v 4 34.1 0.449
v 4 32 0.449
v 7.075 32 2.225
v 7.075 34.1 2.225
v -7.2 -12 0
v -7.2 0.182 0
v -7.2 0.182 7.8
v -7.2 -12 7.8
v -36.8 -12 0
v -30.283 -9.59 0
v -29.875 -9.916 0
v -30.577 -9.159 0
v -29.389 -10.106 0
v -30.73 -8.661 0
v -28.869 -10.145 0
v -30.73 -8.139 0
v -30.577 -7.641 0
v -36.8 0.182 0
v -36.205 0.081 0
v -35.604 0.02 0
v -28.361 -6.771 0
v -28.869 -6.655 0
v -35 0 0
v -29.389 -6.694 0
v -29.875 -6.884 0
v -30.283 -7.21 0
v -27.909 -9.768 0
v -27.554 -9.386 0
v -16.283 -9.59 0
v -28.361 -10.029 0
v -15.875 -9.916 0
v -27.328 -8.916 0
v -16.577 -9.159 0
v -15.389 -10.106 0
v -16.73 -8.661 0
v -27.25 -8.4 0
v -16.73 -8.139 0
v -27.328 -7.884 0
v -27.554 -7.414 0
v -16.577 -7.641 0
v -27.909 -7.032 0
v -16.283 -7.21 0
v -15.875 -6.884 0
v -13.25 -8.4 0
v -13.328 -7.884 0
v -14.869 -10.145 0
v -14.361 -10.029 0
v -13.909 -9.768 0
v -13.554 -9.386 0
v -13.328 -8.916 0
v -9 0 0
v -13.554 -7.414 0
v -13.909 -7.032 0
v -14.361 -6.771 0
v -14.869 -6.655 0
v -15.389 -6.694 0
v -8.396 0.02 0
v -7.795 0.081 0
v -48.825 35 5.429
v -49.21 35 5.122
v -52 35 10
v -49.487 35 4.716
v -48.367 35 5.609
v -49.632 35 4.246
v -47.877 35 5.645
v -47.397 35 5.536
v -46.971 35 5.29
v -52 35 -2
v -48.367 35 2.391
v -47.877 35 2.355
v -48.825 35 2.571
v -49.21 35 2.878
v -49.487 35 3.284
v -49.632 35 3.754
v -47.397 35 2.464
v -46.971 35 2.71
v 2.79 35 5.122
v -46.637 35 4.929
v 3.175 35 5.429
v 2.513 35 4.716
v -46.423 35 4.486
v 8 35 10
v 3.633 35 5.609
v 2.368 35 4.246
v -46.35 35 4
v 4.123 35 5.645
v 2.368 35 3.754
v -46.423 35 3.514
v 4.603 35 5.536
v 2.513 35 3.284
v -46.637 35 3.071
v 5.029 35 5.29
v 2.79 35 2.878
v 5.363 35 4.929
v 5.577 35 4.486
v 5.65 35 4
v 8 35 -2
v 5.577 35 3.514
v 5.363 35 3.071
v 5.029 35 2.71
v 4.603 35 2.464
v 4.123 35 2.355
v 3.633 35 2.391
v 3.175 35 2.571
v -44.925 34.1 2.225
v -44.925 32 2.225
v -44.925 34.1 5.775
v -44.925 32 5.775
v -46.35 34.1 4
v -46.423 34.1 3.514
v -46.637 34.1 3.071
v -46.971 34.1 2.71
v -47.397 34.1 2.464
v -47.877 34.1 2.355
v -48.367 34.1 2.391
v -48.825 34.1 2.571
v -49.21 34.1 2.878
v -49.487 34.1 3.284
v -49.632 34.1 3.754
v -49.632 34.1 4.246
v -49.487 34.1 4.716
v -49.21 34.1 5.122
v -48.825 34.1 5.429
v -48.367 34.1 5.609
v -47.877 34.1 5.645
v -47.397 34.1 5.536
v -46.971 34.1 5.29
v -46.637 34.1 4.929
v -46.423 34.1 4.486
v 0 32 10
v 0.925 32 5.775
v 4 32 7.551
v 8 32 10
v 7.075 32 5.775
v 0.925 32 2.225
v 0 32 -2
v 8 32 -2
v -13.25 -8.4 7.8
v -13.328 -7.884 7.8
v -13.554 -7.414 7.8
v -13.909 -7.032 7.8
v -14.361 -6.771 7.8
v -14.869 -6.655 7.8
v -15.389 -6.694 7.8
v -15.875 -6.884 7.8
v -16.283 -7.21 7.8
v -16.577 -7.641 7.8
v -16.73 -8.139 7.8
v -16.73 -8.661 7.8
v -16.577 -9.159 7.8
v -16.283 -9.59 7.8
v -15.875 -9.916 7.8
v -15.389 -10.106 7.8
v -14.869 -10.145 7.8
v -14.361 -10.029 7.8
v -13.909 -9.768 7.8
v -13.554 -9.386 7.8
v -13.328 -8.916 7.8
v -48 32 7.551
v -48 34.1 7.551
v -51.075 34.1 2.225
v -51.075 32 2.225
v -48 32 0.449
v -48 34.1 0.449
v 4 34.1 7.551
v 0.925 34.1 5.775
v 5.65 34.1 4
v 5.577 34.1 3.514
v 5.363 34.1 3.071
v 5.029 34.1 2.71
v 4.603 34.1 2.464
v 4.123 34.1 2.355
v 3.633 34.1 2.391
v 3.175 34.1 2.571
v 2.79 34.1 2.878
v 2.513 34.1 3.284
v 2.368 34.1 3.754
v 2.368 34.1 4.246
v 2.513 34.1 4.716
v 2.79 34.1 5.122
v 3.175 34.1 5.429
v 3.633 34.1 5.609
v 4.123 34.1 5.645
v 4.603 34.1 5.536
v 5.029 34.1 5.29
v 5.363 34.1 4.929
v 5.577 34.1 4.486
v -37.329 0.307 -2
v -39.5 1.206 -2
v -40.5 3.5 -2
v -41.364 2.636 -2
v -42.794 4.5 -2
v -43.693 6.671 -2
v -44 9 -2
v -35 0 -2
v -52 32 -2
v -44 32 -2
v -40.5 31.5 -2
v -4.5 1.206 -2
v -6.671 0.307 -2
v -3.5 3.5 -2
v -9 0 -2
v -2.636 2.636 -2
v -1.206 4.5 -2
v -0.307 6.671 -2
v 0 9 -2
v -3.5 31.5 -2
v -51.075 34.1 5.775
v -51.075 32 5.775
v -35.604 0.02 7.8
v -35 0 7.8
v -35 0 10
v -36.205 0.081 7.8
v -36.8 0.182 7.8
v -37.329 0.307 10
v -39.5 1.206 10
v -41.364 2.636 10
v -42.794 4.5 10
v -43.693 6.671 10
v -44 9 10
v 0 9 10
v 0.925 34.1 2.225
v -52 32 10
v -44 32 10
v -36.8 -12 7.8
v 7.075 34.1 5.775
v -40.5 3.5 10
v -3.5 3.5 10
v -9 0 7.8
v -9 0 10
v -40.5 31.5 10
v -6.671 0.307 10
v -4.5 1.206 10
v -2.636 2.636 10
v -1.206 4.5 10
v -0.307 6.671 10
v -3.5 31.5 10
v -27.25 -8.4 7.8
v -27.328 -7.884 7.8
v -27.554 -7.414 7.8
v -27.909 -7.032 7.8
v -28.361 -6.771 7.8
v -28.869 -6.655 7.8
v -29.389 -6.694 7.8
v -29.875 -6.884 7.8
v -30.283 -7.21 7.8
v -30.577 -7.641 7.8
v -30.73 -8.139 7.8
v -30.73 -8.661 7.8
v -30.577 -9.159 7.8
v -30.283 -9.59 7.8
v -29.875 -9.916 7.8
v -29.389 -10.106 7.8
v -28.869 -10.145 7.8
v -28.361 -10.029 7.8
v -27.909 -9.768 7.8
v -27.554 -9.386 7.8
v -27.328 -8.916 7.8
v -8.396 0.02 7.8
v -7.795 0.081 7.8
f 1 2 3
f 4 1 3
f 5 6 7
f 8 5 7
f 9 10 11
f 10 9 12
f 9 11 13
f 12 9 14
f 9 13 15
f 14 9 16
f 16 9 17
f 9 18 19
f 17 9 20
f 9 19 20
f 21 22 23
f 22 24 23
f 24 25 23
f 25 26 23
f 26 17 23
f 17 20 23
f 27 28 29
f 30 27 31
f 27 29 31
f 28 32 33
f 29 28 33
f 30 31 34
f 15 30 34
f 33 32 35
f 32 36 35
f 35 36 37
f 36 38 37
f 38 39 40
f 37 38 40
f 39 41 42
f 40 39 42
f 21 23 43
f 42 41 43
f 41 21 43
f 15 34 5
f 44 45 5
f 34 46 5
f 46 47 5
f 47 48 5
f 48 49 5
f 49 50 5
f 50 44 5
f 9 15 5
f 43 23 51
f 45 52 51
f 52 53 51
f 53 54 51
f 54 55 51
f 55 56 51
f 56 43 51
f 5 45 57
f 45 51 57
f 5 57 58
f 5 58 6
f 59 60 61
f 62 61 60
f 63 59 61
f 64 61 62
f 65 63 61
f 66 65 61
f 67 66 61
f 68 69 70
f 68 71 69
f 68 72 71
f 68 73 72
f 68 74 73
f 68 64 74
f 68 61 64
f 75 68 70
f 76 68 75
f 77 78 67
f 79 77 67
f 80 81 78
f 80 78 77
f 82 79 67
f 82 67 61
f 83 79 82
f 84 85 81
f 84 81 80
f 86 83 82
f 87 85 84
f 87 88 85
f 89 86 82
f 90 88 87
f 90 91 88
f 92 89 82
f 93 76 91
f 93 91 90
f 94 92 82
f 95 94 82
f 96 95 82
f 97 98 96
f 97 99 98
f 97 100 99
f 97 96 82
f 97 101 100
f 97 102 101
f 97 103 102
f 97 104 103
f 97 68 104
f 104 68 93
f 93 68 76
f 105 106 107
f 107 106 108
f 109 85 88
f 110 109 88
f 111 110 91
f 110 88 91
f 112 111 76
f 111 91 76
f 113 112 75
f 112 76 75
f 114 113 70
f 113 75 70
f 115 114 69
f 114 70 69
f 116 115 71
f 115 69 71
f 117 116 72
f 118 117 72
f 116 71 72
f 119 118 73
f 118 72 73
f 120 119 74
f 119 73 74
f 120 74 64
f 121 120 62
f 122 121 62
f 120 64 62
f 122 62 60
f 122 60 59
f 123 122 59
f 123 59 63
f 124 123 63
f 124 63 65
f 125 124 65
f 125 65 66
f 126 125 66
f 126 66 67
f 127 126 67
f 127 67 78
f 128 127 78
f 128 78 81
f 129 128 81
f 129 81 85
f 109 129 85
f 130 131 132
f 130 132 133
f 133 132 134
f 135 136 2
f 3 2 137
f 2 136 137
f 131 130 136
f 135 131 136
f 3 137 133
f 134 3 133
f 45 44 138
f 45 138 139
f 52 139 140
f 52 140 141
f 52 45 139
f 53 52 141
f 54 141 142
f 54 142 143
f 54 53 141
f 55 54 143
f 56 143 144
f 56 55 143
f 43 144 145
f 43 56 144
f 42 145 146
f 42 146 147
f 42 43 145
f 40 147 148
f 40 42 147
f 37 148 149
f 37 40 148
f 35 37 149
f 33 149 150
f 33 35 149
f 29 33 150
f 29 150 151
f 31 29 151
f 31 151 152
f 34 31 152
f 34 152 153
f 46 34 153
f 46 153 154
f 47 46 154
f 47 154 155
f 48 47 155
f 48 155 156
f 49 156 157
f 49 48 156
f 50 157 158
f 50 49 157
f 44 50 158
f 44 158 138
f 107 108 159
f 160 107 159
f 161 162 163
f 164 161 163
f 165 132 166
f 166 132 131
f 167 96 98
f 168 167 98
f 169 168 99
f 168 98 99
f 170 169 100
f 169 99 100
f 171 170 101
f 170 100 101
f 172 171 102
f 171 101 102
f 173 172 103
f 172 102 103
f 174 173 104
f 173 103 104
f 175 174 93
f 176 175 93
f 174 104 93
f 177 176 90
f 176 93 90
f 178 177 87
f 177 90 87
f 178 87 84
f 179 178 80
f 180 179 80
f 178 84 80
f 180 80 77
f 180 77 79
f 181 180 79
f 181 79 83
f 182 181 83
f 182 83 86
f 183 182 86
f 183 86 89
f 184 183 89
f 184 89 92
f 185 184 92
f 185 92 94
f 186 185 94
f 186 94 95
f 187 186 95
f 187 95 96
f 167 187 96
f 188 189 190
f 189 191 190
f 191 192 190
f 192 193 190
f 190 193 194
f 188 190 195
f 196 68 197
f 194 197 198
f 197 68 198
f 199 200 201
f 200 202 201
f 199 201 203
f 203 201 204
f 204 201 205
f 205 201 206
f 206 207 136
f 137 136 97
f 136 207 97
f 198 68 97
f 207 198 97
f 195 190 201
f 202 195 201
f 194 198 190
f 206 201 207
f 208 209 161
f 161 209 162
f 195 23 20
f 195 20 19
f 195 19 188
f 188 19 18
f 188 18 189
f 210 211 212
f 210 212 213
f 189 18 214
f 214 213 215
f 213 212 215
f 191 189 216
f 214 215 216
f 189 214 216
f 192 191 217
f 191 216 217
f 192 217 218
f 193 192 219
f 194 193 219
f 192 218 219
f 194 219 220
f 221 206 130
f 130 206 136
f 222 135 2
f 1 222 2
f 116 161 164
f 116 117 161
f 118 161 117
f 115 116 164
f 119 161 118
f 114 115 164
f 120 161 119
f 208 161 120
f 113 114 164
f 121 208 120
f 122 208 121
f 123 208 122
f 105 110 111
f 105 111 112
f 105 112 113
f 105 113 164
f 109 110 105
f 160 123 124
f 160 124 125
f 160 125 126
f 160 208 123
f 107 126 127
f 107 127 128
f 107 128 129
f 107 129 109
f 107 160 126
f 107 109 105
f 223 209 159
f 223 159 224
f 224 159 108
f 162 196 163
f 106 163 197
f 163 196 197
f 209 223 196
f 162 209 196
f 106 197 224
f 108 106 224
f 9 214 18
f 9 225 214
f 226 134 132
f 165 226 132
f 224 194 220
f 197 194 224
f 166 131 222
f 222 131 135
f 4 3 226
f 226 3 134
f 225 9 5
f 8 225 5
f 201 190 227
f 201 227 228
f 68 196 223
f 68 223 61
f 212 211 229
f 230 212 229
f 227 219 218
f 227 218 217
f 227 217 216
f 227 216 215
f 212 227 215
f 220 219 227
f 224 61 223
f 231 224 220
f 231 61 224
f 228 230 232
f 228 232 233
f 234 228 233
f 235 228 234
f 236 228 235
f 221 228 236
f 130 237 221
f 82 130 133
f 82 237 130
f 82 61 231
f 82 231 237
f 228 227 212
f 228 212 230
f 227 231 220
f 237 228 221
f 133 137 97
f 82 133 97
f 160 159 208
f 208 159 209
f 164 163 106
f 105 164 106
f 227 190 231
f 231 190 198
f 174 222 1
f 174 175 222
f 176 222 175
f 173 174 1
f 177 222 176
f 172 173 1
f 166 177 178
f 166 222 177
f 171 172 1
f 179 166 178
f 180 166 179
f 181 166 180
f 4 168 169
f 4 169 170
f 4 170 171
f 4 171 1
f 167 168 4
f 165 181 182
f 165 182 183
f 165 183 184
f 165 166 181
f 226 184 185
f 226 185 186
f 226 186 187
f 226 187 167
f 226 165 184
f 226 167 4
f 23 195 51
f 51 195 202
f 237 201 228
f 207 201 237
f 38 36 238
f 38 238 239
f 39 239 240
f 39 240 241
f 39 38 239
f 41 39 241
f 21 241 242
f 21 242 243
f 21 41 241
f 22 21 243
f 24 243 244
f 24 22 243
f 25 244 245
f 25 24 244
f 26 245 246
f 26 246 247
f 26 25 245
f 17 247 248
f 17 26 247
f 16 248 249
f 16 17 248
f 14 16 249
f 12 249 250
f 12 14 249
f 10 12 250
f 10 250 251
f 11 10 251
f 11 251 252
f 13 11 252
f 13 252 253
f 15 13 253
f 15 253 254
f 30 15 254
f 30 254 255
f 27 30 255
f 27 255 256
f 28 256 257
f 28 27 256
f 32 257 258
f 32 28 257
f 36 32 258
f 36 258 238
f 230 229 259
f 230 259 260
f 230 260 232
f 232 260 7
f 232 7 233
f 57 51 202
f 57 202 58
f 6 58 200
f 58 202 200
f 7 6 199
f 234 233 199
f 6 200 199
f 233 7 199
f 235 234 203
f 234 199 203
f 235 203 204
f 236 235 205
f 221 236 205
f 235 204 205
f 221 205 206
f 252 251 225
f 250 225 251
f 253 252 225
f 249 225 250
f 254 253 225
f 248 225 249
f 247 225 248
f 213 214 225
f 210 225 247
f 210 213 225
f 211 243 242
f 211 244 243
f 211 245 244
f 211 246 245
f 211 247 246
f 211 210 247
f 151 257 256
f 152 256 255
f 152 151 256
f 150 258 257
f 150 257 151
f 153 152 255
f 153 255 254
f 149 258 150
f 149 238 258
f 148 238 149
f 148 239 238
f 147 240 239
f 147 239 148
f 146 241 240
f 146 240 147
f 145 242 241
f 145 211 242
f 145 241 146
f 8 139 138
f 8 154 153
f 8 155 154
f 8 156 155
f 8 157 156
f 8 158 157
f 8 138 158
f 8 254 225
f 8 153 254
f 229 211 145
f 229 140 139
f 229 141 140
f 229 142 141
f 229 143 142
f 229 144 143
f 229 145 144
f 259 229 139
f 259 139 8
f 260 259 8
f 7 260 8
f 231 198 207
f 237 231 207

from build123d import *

# Parameters (mm, degrees)
SKETCH1_W                = 37
SKETCH1_H                = 28
SKETCH1_R                = 1.75
BOSS_EXTRUDE1_DEPTH      = 7.8
BOSS_EXTRUDE2_DEPTH      = 10
BOSS_EXTRUDE2_DEPTH_BACK = 2
SKETCH1_3_W              = 44
SKETCH1_3_H              = 35
SKETCH1_3_W_2            = 37
SKETCH1_3_H_2            = 28
SKETCH1_3_W_3            = 8
SKETCH1_3_H_3            = 3
FILLET1_R                = 9
CUT_EXTRUDE1_DEPTH       = 2.1
HOLE1_D                  = 3.3


with BuildPart() as part:
    # Sketch1 → Boss-Extrude1 (new body)
    with BuildSketch(Plane.XY):
        Polygon((-7.2, 0), (0, 0), (0, 32), (8, 32), (8, 35), (-52, 35), (-52, 32), (-44, 32), (-44, 0), (-36.8, 0), (-36.8, -12), (-7.2, -12), align=None)
        with Locations((-22, 17.5)):
            Rectangle(SKETCH1_W, SKETCH1_H, mode=Mode.SUBTRACT)
        with Locations((-15, -8.4)):
            Circle(SKETCH1_R, mode=Mode.SUBTRACT)
        with Locations((-29, -8.4)):
            Circle(SKETCH1_R, mode=Mode.SUBTRACT)
    extrude(amount=BOSS_EXTRUDE1_DEPTH)

    # Sketch1<3> → Boss-Extrude2 (add, two sides: drawn at the far end of the back side and taken through both)
    # profile 1 of 3: a face of its own
    with BuildSketch(Plane.XY.offset(-BOSS_EXTRUDE2_DEPTH_BACK)):
        with Locations((-22, 17.5)):
            Rectangle(SKETCH1_3_W, SKETCH1_3_H)
        with Locations((-22, 17.5)):
            Rectangle(SKETCH1_3_W_2, SKETCH1_3_H_2, mode=Mode.SUBTRACT)
    # profile 2 of 3: a face of its own
    with BuildSketch(Plane.XY.offset(-BOSS_EXTRUDE2_DEPTH_BACK)):
        with Locations((4, 33.5)):
            Rectangle(SKETCH1_3_W_3, SKETCH1_3_H_3)
    # profile 3 of 3: a face of its own
    with BuildSketch(Plane.XY.offset(-BOSS_EXTRUDE2_DEPTH_BACK)):
        with Locations((-48, 33.5)):
            Rectangle(SKETCH1_3_W_3, SKETCH1_3_H_3)
    extrude(amount=BOSS_EXTRUDE2_DEPTH + BOSS_EXTRUDE2_DEPTH_BACK)

    # Fillet1
    # the kernel refuses this fillet: 9 mm, written as the material it takes off along each edge
    with BuildSketch(Plane(origin=(0, 0, -24.5), x_dir=(-1, 0, 0), z_dir=(0, 0, 1))) as fillet1_piece_1_section:
        with BuildLine():
            CenterArc((FILLET1_R, -FILLET1_R), FILLET1_R, 90, 90)
            Line((0, -FILLET1_R), (0, 0))
            Line((0, 0), (FILLET1_R, 0))
        make_face()
    fillet1_piece_1 = extrude(amount=57, mode=Mode.PRIVATE)
    fillet1_piece_1 = split(fillet1_piece_1, bisect_by=Plane(origin=(-7.2, -0.053721548, -12.25), z_dir=(-1, 0, 0)), keep=Keep.TOP, mode=Mode.PRIVATE)
    fillet1_piece_1 = split(fillet1_piece_1, bisect_by=Plane(origin=(-7.986757567, -0.053721548, 0), z_dir=(0, 0, -1)), keep=Keep.TOP, mode=Mode.PRIVATE)
    add(fillet1_piece_1, mode=Mode.SUBTRACT)
    with BuildSketch(Plane(origin=(0, 0, -24.5), x_dir=(-1, 0, 0), z_dir=(0, 0, 1))) as fillet1_piece_2_section:
        with BuildLine():
            CenterArc((FILLET1_R, -FILLET1_R), FILLET1_R, 90, 90)
            Line((0, -FILLET1_R), (0, 0))
            Line((0, 0), (FILLET1_R, 0))
        make_face()
    fillet1_piece_2 = extrude(amount=57, mode=Mode.PRIVATE)
    fillet1_piece_2 = split(fillet1_piece_2, bisect_by=Plane(origin=(-7.2, 2.082298627, -12.25), z_dir=(1, 0, 0)), keep=Keep.TOP, mode=Mode.PRIVATE)
    fillet1_piece_2 = split(fillet1_piece_2, bisect_by=Plane(origin=(-1.910273674, 2.082298627, 0), z_dir=(0, 0, -1)), keep=Keep.TOP, mode=Mode.PRIVATE)
    add(fillet1_piece_2, mode=Mode.SUBTRACT)
    with BuildSketch(Plane(origin=(0, 0, -24.5), x_dir=(-1, 0, 0), z_dir=(0, 0, 1))) as fillet1_piece_3_section:
        with BuildLine():
            CenterArc((FILLET1_R, -FILLET1_R), FILLET1_R, 90, 90)
            Line((0, -FILLET1_R), (0, 0))
            Line((0, 0), (FILLET1_R, 0))
        make_face()
    fillet1_piece_3 = extrude(amount=57, mode=Mode.PRIVATE)
    fillet1_piece_3 = split(fillet1_piece_3, bisect_by=Plane(origin=(-7.2, 2.082298627, 3.9), z_dir=(1, 0, 0)), keep=Keep.TOP, mode=Mode.PRIVATE)
    fillet1_piece_3 = split(fillet1_piece_3, bisect_by=Plane(origin=(-1.910273674, 2.082298627, 7.8), z_dir=(0, 0, -1)), keep=Keep.TOP, mode=Mode.PRIVATE)
    fillet1_piece_3 = split(fillet1_piece_3, bisect_by=Plane(origin=(-1.910273674, 2.082298627, 0), z_dir=(0, 0, 1)), keep=Keep.TOP, mode=Mode.PRIVATE)
    add(fillet1_piece_3, mode=Mode.SUBTRACT)
    with BuildSketch(Plane(origin=(0, 0, -24.5), x_dir=(-1, 0, 0), z_dir=(0, 0, 1))) as fillet1_piece_4_section:
        with BuildLine():
            CenterArc((FILLET1_R, -FILLET1_R), FILLET1_R, 90, 90)
            Line((0, -FILLET1_R), (0, 0))
            Line((0, 0), (FILLET1_R, 0))
        make_face()
    fillet1_piece_4 = extrude(amount=57, mode=Mode.PRIVATE)
    fillet1_piece_4 = split(fillet1_piece_4, bisect_by=Plane(origin=(-7.2, -0.053721548, 20.15), z_dir=(-1, 0, 0)), keep=Keep.TOP, mode=Mode.PRIVATE)
    fillet1_piece_4 = split(fillet1_piece_4, bisect_by=Plane(origin=(-7.986757567, -0.053721548, 7.8), z_dir=(0, 0, 1)), keep=Keep.TOP, mode=Mode.PRIVATE)
    add(fillet1_piece_4, mode=Mode.SUBTRACT)
    with BuildSketch(Plane(origin=(0, 0, -24.5), x_dir=(-1, 0, 0), z_dir=(0, 0, 1))) as fillet1_piece_5_section:
        with BuildLine():
            CenterArc((FILLET1_R, -FILLET1_R), FILLET1_R, 90, 90)
            Line((0, -FILLET1_R), (0, 0))
            Line((0, 0), (FILLET1_R, 0))
        make_face()
    fillet1_piece_5 = extrude(amount=57, mode=Mode.PRIVATE)
    fillet1_piece_5 = split(fillet1_piece_5, bisect_by=Plane(origin=(-7.2, 2.082298627, 20.15), z_dir=(1, 0, 0)), keep=Keep.TOP, mode=Mode.PRIVATE)
    fillet1_piece_5 = split(fillet1_piece_5, bisect_by=Plane(origin=(-1.910273674, 2.082298627, 7.8), z_dir=(0, 0, 1)), keep=Keep.TOP, mode=Mode.PRIVATE)
    add(fillet1_piece_5, mode=Mode.SUBTRACT)
    with BuildSketch(Plane(origin=(-44, 0, 32.5), x_dir=(1, 0, 0), z_dir=(0, 0, -1))) as fillet1_piece_6_section:
        with BuildLine():
            CenterArc((FILLET1_R, -FILLET1_R), FILLET1_R, 90, 90)
            Line((0, -FILLET1_R), (0, 0))
            Line((0, 0), (FILLET1_R, 0))
        make_face()
    fillet1_piece_6 = extrude(amount=57, mode=Mode.PRIVATE)
    fillet1_piece_6 = split(fillet1_piece_6, bisect_by=Plane(origin=(-36.013242433, -0.053721548, 7.8), z_dir=(0, 0, 1)), keep=Keep.TOP, mode=Mode.PRIVATE)
    fillet1_piece_6 = split(fillet1_piece_6, bisect_by=Plane(origin=(-36.8, -0.053721548, 20.15), z_dir=(1, 0, 0)), keep=Keep.TOP, mode=Mode.PRIVATE)
    add(fillet1_piece_6, mode=Mode.SUBTRACT)
    with BuildSketch(Plane(origin=(-44, 0, 32.5), x_dir=(1, 0, 0), z_dir=(0, 0, -1))) as fillet1_piece_7_section:
        with BuildLine():
            CenterArc((FILLET1_R, -FILLET1_R), FILLET1_R, 90, 90)
            Line((0, -FILLET1_R), (0, 0))
            Line((0, 0), (FILLET1_R, 0))
        make_face()
    fillet1_piece_7 = extrude(amount=57, mode=Mode.PRIVATE)
    fillet1_piece_7 = split(fillet1_piece_7, bisect_by=Plane(origin=(-42.089726326, 2.082298627, 7.8), z_dir=(0, 0, 1)), keep=Keep.TOP, mode=Mode.PRIVATE)
    fillet1_piece_7 = split(fillet1_piece_7, bisect_by=Plane(origin=(-36.8, 2.082298627, 20.15), z_dir=(-1, 0, 0)), keep=Keep.TOP, mode=Mode.PRIVATE)
    add(fillet1_piece_7, mode=Mode.SUBTRACT)
    with BuildSketch(Plane(origin=(-44, 0, 32.5), x_dir=(1, 0, 0), z_dir=(0, 0, -1))) as fillet1_piece_8_section:
        with BuildLine():
            CenterArc((FILLET1_R, -FILLET1_R), FILLET1_R, 90, 90)
            Line((0, -FILLET1_R), (0, 0))
            Line((0, 0), (FILLET1_R, 0))
        make_face()
    fillet1_piece_8 = extrude(amount=57, mode=Mode.PRIVATE)
    fillet1_piece_8 = split(fillet1_piece_8, bisect_by=Plane(origin=(-42.089726326, 2.082298627, 7.8), z_dir=(0, 0, -1)), keep=Keep.TOP, mode=Mode.PRIVATE)
    fillet1_piece_8 = split(fillet1_piece_8, bisect_by=Plane(origin=(-36.8, 2.082298627, 3.9), z_dir=(-1, 0, 0)), keep=Keep.TOP, mode=Mode.PRIVATE)
    fillet1_piece_8 = split(fillet1_piece_8, bisect_by=Plane(origin=(-42.089726326, 2.082298627, 0), z_dir=(0, 0, 1)), keep=Keep.TOP, mode=Mode.PRIVATE)
    add(fillet1_piece_8, mode=Mode.SUBTRACT)
    with BuildSketch(Plane(origin=(-44, 0, 32.5), x_dir=(1, 0, 0), z_dir=(0, 0, -1))) as fillet1_piece_9_section:
        with BuildLine():
            CenterArc((FILLET1_R, -FILLET1_R), FILLET1_R, 90, 90)
            Line((0, -FILLET1_R), (0, 0))
            Line((0, 0), (FILLET1_R, 0))
        make_face()
    fillet1_piece_9 = extrude(amount=57, mode=Mode.PRIVATE)
    fillet1_piece_9 = split(fillet1_piece_9, bisect_by=Plane(origin=(-36.8, -0.053721548, -12.25), z_dir=(1, 0, 0)), keep=Keep.TOP, mode=Mode.PRIVATE)
    fillet1_piece_9 = split(fillet1_piece_9, bisect_by=Plane(origin=(-36.013242433, -0.053721548, 0), z_dir=(0, 0, -1)), keep=Keep.TOP, mode=Mode.PRIVATE)
    add(fillet1_piece_9, mode=Mode.SUBTRACT)
    with BuildSketch(Plane(origin=(-44, 0, 32.5), x_dir=(1, 0, 0), z_dir=(0, 0, -1))) as fillet1_piece_10_section:
        with BuildLine():
            CenterArc((FILLET1_R, -FILLET1_R), FILLET1_R, 90, 90)
            Line((0, -FILLET1_R), (0, 0))
            Line((0, 0), (FILLET1_R, 0))
        make_face()
    fillet1_piece_10 = extrude(amount=57, mode=Mode.PRIVATE)
    fillet1_piece_10 = split(fillet1_piece_10, bisect_by=Plane(origin=(-36.8, 2.082298627, -12.25), z_dir=(-1, 0, 0)), keep=Keep.TOP, mode=Mode.PRIVATE)
    fillet1_piece_10 = split(fillet1_piece_10, bisect_by=Plane(origin=(-42.089726326, 2.082298627, 0), z_dir=(0, 0, -1)), keep=Keep.TOP, mode=Mode.PRIVATE)
    add(fillet1_piece_10, mode=Mode.SUBTRACT)

    # Sketch2 → Cut-Extrude1 (cut)
    with BuildSketch(Plane.XZ.offset(-32)):
        Polygon((-48, 0.449295844), (-44.925, 2.224647922), (-44.925, 5.775352078), (-48, 7.550704156), (-51.075, 5.775352078), (-51.075, 2.224647922), align=None)
        Polygon((0.925, 5.775352078), (0.925, 2.224647922), (4, 0.449295844), (7.075, 2.224647922), (7.075, 5.775352078), (4, 7.550704156), align=None)
    extrude(amount=-CUT_EXTRUDE1_DEPTH, mode=Mode.SUBTRACT)

    # Hole1 (through all)
    with Locations(Plane(origin=(-48, 32, 4), x_dir=(-1, 0, 0), z_dir=(0, -1, 0))):
        with Locations((0, 0), (-52, 0)):
            Hole(HOLE1_D / 2)


solid = part.part
